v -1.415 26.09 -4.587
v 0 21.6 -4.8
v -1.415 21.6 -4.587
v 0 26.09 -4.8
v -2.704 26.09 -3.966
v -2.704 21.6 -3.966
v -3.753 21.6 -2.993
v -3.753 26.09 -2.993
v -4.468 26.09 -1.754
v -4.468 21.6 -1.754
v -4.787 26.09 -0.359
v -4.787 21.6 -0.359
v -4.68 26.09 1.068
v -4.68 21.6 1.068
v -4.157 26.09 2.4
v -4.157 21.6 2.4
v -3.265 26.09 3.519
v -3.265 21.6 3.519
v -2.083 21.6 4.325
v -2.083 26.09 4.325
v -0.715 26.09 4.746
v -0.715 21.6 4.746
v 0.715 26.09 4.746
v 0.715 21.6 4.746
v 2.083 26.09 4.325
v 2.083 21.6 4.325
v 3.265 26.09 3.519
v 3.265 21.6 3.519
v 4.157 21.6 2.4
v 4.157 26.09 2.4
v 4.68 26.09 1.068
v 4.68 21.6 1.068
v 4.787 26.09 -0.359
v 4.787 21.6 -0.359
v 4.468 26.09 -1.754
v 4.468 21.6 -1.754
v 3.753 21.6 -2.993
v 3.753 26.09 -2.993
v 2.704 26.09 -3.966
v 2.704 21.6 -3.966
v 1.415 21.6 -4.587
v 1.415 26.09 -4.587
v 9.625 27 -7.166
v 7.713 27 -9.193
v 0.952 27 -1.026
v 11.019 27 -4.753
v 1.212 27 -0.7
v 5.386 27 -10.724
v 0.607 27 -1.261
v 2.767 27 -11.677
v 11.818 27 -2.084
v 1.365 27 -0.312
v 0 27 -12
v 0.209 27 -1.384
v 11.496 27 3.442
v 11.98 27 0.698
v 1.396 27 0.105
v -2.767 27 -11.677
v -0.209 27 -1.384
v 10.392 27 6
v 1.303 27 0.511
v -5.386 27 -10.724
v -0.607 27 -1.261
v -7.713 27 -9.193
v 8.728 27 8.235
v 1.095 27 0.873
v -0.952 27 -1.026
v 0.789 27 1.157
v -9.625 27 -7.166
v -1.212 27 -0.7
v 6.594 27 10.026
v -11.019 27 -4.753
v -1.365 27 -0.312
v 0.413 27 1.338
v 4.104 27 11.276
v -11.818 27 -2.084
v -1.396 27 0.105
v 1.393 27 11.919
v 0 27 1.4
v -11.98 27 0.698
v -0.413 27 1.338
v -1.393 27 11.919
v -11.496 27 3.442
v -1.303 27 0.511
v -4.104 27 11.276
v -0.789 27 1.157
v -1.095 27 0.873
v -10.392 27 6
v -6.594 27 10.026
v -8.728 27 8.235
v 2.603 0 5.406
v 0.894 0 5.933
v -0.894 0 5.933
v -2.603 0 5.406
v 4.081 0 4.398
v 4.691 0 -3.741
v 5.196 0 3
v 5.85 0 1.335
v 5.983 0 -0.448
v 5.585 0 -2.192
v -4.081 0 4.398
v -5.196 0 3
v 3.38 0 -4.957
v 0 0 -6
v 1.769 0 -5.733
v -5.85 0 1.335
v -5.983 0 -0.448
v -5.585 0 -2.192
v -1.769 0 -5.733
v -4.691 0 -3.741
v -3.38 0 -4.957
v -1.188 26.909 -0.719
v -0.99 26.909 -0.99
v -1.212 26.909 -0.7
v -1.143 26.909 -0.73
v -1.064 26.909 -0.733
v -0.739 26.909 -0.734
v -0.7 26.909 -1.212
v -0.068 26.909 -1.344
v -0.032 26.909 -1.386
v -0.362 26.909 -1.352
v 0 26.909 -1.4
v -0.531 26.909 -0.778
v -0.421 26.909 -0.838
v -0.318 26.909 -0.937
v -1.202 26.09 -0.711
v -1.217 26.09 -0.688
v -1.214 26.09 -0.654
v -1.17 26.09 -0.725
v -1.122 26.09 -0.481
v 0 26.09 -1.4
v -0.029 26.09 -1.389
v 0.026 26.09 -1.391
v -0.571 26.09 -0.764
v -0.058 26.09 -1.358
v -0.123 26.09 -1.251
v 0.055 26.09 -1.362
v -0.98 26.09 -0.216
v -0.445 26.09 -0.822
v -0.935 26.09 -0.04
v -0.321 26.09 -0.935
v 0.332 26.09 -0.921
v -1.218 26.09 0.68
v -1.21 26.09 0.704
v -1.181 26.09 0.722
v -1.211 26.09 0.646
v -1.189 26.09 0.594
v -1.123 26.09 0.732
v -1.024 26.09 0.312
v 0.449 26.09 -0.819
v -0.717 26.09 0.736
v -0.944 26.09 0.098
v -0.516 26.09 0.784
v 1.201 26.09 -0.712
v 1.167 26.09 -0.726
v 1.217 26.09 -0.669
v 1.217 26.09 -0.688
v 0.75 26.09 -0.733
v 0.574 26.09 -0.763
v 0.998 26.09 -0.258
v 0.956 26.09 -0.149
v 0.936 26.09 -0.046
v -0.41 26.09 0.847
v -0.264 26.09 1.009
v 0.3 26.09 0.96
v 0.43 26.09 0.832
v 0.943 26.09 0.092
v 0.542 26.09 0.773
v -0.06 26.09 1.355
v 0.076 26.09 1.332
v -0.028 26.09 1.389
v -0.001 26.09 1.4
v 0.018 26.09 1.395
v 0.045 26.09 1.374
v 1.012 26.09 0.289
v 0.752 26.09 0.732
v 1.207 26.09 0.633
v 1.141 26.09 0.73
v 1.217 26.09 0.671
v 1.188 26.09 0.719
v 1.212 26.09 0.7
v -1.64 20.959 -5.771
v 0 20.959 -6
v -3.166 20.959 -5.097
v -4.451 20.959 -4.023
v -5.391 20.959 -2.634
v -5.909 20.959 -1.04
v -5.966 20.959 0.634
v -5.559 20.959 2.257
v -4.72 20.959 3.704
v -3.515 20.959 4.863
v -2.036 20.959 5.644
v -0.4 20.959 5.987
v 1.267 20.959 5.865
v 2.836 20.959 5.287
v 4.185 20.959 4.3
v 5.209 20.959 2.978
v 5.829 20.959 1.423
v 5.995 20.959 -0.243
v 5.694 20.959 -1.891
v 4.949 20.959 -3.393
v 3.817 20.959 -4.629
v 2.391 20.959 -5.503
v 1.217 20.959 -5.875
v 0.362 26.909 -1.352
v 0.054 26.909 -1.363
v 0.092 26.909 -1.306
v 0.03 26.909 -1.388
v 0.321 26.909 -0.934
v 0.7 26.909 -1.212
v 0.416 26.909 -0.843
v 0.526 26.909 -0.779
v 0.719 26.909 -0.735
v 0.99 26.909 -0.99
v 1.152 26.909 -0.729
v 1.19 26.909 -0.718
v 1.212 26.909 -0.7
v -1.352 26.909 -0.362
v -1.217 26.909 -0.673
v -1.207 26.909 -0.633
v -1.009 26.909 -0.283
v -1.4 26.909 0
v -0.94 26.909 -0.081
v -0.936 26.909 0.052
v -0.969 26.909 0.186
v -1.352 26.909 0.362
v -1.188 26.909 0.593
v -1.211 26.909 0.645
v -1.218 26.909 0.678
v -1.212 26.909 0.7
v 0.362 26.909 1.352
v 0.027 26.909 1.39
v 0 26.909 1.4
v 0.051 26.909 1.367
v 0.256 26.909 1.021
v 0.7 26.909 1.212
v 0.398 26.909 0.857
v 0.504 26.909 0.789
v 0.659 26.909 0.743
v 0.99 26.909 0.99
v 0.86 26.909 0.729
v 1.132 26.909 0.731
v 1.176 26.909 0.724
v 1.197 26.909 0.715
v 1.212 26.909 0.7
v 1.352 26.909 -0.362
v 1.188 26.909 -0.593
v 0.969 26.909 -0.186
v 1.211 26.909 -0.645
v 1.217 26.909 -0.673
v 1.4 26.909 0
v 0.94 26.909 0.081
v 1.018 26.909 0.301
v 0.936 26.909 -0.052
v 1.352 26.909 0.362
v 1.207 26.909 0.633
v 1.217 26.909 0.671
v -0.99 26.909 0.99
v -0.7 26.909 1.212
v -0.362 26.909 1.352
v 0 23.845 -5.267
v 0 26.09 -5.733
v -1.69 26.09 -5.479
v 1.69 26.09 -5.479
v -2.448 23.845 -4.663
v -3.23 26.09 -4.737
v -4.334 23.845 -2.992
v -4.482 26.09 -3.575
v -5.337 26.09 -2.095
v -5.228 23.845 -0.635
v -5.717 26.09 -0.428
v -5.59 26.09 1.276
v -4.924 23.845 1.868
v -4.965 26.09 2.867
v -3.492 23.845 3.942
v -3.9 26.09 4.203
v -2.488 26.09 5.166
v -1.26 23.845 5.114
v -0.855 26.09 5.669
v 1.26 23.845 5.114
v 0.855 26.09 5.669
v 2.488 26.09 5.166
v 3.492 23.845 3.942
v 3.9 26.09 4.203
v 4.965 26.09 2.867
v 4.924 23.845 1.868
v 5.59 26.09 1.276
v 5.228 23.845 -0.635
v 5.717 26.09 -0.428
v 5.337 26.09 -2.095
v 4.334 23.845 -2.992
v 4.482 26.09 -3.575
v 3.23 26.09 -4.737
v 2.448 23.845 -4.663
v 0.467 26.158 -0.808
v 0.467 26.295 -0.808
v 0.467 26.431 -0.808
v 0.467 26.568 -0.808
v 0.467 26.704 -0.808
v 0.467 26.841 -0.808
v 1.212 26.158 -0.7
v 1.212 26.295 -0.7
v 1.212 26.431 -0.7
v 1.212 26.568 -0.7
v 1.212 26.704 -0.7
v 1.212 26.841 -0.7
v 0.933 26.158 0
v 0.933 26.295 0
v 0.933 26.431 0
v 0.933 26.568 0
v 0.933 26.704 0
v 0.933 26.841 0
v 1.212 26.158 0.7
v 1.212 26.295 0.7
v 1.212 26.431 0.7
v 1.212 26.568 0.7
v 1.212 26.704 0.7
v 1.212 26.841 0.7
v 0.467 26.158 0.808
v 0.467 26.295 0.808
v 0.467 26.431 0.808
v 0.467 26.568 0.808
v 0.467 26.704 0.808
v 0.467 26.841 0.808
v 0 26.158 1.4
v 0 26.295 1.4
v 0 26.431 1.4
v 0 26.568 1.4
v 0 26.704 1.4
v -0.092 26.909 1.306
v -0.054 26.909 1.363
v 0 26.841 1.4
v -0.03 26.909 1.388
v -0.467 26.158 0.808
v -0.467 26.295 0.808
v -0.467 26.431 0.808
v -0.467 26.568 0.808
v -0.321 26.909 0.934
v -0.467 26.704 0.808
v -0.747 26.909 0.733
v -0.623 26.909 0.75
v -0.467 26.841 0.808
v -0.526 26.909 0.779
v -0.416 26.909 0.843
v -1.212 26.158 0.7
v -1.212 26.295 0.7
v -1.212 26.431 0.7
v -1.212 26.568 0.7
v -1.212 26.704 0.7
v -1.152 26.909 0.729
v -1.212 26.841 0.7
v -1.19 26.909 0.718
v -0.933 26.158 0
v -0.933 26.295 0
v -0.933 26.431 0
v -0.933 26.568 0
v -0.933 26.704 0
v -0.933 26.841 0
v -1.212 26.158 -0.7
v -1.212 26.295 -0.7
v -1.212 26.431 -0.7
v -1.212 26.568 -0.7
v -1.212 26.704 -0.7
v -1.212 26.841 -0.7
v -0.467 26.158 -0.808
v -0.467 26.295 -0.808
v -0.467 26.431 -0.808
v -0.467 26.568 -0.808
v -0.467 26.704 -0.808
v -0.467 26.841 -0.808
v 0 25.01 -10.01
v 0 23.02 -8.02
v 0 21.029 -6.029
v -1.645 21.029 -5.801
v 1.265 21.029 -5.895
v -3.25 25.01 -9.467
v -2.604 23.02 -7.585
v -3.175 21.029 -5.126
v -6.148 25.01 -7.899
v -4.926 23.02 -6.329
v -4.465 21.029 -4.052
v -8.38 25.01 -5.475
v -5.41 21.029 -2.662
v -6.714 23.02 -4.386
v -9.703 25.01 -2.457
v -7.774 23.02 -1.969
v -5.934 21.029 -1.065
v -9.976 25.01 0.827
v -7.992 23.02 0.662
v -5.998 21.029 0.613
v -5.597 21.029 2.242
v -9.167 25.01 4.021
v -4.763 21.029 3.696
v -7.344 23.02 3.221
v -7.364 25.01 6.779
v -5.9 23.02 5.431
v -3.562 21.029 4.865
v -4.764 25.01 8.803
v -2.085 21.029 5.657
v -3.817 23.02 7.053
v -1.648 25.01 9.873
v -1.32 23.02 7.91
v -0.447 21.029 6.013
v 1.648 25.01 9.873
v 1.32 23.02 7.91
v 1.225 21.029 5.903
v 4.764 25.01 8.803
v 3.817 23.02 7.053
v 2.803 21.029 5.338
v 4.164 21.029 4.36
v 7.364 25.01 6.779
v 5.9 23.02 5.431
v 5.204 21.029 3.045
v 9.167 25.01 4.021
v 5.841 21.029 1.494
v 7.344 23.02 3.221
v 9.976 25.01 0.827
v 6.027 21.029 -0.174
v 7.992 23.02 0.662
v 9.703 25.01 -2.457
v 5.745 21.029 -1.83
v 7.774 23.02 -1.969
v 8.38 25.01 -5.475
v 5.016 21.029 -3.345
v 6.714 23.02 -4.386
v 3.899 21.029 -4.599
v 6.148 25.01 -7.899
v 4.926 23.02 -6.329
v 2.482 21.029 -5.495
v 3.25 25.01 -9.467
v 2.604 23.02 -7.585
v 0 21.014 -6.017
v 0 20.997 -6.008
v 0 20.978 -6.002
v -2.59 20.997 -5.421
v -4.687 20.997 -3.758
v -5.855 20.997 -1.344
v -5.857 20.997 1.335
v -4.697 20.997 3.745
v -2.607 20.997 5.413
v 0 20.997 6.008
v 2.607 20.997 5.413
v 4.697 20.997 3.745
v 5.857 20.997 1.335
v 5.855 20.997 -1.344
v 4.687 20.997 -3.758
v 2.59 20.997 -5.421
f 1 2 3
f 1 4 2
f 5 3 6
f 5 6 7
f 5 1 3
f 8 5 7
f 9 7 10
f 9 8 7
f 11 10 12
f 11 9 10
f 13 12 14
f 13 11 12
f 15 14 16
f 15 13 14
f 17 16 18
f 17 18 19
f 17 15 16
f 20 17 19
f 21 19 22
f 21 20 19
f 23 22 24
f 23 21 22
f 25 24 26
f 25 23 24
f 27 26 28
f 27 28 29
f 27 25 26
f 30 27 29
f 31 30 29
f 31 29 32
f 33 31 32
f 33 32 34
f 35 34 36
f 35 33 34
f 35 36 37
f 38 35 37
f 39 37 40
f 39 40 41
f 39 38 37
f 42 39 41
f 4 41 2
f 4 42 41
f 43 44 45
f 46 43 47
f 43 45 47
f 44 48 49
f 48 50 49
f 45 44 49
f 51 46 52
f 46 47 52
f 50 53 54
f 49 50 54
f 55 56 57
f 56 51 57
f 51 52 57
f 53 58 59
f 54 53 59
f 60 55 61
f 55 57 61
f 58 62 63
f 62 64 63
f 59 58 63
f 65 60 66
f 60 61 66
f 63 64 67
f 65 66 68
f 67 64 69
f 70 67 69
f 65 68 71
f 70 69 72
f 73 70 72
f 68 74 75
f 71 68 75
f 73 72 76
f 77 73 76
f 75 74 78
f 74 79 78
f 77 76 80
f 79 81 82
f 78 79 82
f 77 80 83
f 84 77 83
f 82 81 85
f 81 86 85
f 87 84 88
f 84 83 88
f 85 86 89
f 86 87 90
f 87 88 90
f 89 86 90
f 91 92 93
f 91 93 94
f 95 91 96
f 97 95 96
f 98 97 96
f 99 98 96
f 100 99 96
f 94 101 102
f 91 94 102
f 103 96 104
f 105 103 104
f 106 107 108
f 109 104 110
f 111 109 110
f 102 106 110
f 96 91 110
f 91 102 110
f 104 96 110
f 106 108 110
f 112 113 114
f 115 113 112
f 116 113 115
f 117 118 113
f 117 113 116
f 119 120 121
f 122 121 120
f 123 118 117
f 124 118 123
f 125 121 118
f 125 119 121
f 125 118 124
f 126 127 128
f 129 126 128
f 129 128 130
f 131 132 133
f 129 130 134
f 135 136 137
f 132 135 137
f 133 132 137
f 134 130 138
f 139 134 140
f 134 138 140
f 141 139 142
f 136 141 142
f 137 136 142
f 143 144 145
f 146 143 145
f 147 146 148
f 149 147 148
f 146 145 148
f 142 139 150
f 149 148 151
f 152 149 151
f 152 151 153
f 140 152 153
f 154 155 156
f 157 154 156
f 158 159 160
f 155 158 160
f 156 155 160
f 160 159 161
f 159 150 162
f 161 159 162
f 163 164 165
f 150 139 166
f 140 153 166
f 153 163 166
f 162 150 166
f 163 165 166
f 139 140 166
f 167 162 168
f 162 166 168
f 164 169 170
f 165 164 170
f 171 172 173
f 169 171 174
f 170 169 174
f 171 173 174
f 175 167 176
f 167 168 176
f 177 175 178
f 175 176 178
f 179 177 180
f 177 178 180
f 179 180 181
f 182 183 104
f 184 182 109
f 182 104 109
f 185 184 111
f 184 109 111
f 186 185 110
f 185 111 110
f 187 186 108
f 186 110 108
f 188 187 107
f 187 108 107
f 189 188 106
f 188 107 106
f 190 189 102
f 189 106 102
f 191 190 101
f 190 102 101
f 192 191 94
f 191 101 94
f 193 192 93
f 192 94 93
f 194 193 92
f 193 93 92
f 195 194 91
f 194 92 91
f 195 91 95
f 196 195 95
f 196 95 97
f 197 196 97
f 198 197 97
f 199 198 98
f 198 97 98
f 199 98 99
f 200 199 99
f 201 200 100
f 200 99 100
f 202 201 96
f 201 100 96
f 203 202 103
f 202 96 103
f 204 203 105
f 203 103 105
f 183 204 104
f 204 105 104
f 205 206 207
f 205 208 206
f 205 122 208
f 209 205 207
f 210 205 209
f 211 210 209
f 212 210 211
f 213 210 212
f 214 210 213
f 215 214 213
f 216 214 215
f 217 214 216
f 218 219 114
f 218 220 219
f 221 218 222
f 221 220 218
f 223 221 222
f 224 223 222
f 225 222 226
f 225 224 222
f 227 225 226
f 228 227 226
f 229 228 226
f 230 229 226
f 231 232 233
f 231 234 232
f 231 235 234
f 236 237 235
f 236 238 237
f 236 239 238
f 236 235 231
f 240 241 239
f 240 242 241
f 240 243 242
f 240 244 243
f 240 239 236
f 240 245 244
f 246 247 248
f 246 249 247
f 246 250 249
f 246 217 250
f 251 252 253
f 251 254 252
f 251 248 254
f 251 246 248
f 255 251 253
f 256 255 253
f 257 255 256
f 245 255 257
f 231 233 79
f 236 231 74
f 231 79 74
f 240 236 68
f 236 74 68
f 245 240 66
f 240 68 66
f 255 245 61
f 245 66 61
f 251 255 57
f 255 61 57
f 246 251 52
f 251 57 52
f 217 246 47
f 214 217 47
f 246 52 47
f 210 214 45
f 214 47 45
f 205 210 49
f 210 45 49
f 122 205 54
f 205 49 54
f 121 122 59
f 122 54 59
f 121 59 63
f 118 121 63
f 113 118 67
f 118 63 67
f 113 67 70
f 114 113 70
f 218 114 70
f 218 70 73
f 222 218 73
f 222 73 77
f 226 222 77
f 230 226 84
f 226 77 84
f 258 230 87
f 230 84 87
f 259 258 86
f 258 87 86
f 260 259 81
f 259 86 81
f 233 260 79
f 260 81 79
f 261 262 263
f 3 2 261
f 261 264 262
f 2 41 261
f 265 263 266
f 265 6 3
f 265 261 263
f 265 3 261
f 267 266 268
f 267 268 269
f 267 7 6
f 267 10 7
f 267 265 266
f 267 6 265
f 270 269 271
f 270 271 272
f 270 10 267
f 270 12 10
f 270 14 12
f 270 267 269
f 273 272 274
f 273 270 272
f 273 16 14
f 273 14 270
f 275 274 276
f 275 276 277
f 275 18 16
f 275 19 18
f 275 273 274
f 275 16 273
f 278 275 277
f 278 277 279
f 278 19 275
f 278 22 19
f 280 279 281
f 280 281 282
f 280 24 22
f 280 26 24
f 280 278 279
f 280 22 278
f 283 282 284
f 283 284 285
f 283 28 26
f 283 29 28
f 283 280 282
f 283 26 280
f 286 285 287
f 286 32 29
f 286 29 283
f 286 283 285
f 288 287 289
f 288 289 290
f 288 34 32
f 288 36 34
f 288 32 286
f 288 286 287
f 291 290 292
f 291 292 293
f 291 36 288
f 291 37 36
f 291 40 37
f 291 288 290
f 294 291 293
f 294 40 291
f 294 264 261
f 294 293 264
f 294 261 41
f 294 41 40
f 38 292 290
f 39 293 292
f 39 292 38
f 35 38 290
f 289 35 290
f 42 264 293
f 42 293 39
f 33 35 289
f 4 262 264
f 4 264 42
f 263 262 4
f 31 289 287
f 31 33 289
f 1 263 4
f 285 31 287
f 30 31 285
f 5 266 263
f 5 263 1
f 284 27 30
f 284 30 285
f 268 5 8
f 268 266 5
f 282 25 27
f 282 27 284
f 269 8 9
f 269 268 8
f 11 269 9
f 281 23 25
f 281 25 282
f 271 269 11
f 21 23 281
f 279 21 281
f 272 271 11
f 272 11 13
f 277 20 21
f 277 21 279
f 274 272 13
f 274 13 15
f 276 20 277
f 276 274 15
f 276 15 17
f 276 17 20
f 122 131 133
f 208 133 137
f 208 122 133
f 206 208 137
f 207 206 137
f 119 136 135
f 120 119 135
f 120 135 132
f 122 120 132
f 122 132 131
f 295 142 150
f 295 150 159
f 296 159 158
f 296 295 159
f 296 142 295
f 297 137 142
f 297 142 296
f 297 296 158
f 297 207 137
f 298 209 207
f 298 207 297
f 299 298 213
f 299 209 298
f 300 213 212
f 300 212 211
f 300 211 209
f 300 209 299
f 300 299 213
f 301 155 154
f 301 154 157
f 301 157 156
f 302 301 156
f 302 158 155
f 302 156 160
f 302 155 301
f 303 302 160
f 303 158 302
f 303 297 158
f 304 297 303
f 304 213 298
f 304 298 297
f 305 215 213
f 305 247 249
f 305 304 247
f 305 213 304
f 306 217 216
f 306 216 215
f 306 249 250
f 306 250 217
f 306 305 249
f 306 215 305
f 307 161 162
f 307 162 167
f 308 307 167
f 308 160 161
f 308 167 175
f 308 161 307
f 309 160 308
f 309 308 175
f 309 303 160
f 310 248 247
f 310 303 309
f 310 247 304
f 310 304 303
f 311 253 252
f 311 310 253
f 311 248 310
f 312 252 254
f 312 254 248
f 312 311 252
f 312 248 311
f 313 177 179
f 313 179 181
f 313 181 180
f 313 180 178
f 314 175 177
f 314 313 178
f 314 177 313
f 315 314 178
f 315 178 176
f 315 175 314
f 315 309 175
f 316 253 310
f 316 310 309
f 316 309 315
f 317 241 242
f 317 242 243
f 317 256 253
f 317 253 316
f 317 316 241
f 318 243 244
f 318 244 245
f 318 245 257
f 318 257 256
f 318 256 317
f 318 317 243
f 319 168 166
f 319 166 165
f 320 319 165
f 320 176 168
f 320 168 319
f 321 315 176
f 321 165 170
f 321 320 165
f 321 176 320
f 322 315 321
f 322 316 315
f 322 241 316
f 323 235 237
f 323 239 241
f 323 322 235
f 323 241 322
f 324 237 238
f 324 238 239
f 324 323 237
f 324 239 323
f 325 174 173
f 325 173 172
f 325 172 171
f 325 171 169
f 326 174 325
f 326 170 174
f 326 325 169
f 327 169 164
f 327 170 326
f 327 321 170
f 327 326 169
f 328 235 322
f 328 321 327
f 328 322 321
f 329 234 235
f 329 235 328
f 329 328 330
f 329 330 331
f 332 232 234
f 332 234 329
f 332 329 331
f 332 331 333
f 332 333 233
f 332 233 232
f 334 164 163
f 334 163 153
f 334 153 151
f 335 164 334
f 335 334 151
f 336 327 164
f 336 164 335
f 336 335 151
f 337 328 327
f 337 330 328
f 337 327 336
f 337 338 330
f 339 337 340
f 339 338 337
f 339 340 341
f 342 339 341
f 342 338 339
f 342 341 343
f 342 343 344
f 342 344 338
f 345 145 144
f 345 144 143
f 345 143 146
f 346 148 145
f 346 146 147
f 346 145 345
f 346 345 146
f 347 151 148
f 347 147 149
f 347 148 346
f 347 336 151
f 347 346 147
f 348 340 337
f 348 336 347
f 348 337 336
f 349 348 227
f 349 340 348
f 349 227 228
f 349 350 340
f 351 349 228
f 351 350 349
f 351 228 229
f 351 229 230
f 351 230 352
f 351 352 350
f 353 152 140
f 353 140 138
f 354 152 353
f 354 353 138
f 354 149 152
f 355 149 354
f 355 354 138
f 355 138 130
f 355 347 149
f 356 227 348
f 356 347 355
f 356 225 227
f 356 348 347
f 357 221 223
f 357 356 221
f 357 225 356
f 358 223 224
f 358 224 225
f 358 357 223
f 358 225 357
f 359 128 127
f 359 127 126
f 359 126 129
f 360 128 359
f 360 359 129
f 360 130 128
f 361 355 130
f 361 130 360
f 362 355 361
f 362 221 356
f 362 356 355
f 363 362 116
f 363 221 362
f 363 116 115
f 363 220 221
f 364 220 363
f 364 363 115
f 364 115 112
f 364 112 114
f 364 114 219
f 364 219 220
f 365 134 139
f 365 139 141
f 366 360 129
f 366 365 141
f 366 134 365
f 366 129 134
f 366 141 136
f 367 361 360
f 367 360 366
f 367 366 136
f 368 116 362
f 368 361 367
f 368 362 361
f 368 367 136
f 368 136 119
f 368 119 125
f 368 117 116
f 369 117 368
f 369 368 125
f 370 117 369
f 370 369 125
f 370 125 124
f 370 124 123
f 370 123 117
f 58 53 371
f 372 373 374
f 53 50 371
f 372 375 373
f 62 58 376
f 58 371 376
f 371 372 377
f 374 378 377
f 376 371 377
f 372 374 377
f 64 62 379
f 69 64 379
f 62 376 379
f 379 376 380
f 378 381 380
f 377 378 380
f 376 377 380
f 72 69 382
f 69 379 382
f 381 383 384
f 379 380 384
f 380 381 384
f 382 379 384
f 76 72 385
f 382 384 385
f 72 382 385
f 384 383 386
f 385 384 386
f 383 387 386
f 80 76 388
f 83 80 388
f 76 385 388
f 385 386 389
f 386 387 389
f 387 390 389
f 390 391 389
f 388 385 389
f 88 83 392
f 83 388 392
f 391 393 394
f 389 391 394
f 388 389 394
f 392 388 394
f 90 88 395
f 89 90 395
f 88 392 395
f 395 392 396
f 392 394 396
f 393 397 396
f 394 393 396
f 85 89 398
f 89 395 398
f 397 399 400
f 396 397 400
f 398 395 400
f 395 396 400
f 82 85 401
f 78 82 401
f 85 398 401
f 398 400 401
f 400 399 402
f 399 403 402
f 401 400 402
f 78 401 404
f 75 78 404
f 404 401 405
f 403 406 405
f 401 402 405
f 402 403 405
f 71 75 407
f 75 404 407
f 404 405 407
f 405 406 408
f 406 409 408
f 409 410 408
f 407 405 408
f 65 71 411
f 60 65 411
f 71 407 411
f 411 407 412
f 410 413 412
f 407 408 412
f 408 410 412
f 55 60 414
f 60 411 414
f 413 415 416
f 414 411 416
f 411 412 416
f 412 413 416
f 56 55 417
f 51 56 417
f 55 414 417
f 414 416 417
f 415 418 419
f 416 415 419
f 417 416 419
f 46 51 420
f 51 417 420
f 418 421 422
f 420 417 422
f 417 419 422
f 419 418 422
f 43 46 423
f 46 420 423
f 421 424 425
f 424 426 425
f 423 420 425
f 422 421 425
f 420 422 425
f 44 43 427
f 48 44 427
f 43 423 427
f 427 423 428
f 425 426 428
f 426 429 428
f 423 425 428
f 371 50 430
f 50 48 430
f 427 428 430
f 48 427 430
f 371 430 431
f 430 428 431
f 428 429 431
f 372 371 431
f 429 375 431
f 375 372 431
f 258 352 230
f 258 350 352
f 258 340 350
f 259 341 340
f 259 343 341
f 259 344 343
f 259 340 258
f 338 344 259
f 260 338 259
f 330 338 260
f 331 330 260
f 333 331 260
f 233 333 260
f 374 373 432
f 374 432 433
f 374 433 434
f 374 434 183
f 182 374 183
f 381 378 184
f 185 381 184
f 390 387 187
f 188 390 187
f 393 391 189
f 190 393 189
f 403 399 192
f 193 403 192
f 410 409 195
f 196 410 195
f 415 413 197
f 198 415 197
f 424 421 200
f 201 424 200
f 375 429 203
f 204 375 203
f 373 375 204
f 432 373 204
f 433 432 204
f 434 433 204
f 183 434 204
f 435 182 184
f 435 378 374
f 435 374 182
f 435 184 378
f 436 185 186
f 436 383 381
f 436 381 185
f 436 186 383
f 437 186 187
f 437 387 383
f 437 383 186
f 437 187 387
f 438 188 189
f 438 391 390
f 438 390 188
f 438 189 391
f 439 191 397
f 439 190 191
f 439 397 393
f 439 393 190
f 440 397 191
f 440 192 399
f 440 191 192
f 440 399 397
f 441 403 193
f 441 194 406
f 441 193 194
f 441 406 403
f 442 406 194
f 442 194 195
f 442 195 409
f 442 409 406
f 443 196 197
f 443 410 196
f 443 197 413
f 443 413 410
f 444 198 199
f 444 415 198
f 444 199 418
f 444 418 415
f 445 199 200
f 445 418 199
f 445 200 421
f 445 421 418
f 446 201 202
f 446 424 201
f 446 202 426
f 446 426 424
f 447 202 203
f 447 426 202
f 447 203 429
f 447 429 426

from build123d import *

# Parameters (mm, degrees)
RECESS_CUT_EXTRUDE1_DEPTH = 0.91
SKETCH3_R                 = 1.4
RECESS_CUT_EXTRUDE2_DEPTH = 0.091
FILLET1_R                 = 0.1


with BuildPart() as part:
    # Sketch1 → Body-Revolve (revolve)
    with BuildSketch(Plane.XY, mode=Mode.PRIVATE) as body_revolve_sk:
        Polygon((0, 27), (12, 27), (6, 21), (6, 0), (0, 0), align=None)
    revolve(body_revolve_sk.sketch.rotate(Axis((0, 0, 0), (0, 1, 0)), 90), axis=Axis((0, 0, 0), (0, 1, 0)))

    # Sketch2 → Recess-Cut-Extrude1 (cut)
    with BuildSketch(Plane(origin=(0, 27, 0), x_dir=(-1, 0, 0), z_dir=(0, 1, 0))):
        with BuildLine():
            add(Edge.make_bspline(
                [(0, -1.4), (-0.100650939, -1.4), (-0.301952816, -0.522997619), (-1.592188736, -0.919250595), (-0.603905632, 0), (-1.592188736, 0.919250595), (-0.301952816, 0.522997619), (0, 1.838501191), (0.301952816, 0.522997619), (1.592188736, 0.919250595), (0.603905632, 0), (1.592188736, -0.919250595), (0.301952816, -0.522997619), (0.100650939, -1.4), (0, -1.4)],
                knots=[0, 0, 0, 0, 0.083333333, 0.166666667, 0.25, 0.333333333, 0.416666667, 0.5, 0.583333333, 0.666666667, 0.75, 0.833333333, 0.916666667, 1, 1, 1, 1], degree=3))
        make_face()
    extrude(amount=-RECESS_CUT_EXTRUDE1_DEPTH, mode=Mode.SUBTRACT)

    # Sketch3 → Recess-Cut-Extrude2 (cut)
    with BuildSketch(Plane(origin=(0, 27, 0), x_dir=(-1, 0, 0), z_dir=(0, 1, 0))):
        with Locations(Location((0, 0, 0), (0, 0, 90))):
            Circle(SKETCH3_R)
    extrude(amount=-RECESS_CUT_EXTRUDE2_DEPTH, mode=Mode.SUBTRACT)

    # Sketch4 → Drill-Cut-Revolve (revolve, cut)
    with BuildSketch(Plane(origin=(4.79994809, 0, 0), x_dir=(1, 0, 0), z_dir=(0, 0, 1)), mode=Mode.PRIVATE) as drill_cut_revolve_sk:
        Polygon((0, 26.09), (0.933333333, 26.09), (0, 21.6), align=None)
    revolve(drill_cut_revolve_sk.sketch.rotate(Axis((0, 0, 0), (0, 1, 0)), 90), axis=Axis((0, 0, 0), (0, 1, 0)), mode=Mode.SUBTRACT)

    # Fillet1
    fillet1_edges = [part.edges().sort_by_distance(p)[0] for p in [
        (0, 21, 6),
    ]]
    fillet(fillet1_edges, radius=FILLET1_R)


solid = part.part
